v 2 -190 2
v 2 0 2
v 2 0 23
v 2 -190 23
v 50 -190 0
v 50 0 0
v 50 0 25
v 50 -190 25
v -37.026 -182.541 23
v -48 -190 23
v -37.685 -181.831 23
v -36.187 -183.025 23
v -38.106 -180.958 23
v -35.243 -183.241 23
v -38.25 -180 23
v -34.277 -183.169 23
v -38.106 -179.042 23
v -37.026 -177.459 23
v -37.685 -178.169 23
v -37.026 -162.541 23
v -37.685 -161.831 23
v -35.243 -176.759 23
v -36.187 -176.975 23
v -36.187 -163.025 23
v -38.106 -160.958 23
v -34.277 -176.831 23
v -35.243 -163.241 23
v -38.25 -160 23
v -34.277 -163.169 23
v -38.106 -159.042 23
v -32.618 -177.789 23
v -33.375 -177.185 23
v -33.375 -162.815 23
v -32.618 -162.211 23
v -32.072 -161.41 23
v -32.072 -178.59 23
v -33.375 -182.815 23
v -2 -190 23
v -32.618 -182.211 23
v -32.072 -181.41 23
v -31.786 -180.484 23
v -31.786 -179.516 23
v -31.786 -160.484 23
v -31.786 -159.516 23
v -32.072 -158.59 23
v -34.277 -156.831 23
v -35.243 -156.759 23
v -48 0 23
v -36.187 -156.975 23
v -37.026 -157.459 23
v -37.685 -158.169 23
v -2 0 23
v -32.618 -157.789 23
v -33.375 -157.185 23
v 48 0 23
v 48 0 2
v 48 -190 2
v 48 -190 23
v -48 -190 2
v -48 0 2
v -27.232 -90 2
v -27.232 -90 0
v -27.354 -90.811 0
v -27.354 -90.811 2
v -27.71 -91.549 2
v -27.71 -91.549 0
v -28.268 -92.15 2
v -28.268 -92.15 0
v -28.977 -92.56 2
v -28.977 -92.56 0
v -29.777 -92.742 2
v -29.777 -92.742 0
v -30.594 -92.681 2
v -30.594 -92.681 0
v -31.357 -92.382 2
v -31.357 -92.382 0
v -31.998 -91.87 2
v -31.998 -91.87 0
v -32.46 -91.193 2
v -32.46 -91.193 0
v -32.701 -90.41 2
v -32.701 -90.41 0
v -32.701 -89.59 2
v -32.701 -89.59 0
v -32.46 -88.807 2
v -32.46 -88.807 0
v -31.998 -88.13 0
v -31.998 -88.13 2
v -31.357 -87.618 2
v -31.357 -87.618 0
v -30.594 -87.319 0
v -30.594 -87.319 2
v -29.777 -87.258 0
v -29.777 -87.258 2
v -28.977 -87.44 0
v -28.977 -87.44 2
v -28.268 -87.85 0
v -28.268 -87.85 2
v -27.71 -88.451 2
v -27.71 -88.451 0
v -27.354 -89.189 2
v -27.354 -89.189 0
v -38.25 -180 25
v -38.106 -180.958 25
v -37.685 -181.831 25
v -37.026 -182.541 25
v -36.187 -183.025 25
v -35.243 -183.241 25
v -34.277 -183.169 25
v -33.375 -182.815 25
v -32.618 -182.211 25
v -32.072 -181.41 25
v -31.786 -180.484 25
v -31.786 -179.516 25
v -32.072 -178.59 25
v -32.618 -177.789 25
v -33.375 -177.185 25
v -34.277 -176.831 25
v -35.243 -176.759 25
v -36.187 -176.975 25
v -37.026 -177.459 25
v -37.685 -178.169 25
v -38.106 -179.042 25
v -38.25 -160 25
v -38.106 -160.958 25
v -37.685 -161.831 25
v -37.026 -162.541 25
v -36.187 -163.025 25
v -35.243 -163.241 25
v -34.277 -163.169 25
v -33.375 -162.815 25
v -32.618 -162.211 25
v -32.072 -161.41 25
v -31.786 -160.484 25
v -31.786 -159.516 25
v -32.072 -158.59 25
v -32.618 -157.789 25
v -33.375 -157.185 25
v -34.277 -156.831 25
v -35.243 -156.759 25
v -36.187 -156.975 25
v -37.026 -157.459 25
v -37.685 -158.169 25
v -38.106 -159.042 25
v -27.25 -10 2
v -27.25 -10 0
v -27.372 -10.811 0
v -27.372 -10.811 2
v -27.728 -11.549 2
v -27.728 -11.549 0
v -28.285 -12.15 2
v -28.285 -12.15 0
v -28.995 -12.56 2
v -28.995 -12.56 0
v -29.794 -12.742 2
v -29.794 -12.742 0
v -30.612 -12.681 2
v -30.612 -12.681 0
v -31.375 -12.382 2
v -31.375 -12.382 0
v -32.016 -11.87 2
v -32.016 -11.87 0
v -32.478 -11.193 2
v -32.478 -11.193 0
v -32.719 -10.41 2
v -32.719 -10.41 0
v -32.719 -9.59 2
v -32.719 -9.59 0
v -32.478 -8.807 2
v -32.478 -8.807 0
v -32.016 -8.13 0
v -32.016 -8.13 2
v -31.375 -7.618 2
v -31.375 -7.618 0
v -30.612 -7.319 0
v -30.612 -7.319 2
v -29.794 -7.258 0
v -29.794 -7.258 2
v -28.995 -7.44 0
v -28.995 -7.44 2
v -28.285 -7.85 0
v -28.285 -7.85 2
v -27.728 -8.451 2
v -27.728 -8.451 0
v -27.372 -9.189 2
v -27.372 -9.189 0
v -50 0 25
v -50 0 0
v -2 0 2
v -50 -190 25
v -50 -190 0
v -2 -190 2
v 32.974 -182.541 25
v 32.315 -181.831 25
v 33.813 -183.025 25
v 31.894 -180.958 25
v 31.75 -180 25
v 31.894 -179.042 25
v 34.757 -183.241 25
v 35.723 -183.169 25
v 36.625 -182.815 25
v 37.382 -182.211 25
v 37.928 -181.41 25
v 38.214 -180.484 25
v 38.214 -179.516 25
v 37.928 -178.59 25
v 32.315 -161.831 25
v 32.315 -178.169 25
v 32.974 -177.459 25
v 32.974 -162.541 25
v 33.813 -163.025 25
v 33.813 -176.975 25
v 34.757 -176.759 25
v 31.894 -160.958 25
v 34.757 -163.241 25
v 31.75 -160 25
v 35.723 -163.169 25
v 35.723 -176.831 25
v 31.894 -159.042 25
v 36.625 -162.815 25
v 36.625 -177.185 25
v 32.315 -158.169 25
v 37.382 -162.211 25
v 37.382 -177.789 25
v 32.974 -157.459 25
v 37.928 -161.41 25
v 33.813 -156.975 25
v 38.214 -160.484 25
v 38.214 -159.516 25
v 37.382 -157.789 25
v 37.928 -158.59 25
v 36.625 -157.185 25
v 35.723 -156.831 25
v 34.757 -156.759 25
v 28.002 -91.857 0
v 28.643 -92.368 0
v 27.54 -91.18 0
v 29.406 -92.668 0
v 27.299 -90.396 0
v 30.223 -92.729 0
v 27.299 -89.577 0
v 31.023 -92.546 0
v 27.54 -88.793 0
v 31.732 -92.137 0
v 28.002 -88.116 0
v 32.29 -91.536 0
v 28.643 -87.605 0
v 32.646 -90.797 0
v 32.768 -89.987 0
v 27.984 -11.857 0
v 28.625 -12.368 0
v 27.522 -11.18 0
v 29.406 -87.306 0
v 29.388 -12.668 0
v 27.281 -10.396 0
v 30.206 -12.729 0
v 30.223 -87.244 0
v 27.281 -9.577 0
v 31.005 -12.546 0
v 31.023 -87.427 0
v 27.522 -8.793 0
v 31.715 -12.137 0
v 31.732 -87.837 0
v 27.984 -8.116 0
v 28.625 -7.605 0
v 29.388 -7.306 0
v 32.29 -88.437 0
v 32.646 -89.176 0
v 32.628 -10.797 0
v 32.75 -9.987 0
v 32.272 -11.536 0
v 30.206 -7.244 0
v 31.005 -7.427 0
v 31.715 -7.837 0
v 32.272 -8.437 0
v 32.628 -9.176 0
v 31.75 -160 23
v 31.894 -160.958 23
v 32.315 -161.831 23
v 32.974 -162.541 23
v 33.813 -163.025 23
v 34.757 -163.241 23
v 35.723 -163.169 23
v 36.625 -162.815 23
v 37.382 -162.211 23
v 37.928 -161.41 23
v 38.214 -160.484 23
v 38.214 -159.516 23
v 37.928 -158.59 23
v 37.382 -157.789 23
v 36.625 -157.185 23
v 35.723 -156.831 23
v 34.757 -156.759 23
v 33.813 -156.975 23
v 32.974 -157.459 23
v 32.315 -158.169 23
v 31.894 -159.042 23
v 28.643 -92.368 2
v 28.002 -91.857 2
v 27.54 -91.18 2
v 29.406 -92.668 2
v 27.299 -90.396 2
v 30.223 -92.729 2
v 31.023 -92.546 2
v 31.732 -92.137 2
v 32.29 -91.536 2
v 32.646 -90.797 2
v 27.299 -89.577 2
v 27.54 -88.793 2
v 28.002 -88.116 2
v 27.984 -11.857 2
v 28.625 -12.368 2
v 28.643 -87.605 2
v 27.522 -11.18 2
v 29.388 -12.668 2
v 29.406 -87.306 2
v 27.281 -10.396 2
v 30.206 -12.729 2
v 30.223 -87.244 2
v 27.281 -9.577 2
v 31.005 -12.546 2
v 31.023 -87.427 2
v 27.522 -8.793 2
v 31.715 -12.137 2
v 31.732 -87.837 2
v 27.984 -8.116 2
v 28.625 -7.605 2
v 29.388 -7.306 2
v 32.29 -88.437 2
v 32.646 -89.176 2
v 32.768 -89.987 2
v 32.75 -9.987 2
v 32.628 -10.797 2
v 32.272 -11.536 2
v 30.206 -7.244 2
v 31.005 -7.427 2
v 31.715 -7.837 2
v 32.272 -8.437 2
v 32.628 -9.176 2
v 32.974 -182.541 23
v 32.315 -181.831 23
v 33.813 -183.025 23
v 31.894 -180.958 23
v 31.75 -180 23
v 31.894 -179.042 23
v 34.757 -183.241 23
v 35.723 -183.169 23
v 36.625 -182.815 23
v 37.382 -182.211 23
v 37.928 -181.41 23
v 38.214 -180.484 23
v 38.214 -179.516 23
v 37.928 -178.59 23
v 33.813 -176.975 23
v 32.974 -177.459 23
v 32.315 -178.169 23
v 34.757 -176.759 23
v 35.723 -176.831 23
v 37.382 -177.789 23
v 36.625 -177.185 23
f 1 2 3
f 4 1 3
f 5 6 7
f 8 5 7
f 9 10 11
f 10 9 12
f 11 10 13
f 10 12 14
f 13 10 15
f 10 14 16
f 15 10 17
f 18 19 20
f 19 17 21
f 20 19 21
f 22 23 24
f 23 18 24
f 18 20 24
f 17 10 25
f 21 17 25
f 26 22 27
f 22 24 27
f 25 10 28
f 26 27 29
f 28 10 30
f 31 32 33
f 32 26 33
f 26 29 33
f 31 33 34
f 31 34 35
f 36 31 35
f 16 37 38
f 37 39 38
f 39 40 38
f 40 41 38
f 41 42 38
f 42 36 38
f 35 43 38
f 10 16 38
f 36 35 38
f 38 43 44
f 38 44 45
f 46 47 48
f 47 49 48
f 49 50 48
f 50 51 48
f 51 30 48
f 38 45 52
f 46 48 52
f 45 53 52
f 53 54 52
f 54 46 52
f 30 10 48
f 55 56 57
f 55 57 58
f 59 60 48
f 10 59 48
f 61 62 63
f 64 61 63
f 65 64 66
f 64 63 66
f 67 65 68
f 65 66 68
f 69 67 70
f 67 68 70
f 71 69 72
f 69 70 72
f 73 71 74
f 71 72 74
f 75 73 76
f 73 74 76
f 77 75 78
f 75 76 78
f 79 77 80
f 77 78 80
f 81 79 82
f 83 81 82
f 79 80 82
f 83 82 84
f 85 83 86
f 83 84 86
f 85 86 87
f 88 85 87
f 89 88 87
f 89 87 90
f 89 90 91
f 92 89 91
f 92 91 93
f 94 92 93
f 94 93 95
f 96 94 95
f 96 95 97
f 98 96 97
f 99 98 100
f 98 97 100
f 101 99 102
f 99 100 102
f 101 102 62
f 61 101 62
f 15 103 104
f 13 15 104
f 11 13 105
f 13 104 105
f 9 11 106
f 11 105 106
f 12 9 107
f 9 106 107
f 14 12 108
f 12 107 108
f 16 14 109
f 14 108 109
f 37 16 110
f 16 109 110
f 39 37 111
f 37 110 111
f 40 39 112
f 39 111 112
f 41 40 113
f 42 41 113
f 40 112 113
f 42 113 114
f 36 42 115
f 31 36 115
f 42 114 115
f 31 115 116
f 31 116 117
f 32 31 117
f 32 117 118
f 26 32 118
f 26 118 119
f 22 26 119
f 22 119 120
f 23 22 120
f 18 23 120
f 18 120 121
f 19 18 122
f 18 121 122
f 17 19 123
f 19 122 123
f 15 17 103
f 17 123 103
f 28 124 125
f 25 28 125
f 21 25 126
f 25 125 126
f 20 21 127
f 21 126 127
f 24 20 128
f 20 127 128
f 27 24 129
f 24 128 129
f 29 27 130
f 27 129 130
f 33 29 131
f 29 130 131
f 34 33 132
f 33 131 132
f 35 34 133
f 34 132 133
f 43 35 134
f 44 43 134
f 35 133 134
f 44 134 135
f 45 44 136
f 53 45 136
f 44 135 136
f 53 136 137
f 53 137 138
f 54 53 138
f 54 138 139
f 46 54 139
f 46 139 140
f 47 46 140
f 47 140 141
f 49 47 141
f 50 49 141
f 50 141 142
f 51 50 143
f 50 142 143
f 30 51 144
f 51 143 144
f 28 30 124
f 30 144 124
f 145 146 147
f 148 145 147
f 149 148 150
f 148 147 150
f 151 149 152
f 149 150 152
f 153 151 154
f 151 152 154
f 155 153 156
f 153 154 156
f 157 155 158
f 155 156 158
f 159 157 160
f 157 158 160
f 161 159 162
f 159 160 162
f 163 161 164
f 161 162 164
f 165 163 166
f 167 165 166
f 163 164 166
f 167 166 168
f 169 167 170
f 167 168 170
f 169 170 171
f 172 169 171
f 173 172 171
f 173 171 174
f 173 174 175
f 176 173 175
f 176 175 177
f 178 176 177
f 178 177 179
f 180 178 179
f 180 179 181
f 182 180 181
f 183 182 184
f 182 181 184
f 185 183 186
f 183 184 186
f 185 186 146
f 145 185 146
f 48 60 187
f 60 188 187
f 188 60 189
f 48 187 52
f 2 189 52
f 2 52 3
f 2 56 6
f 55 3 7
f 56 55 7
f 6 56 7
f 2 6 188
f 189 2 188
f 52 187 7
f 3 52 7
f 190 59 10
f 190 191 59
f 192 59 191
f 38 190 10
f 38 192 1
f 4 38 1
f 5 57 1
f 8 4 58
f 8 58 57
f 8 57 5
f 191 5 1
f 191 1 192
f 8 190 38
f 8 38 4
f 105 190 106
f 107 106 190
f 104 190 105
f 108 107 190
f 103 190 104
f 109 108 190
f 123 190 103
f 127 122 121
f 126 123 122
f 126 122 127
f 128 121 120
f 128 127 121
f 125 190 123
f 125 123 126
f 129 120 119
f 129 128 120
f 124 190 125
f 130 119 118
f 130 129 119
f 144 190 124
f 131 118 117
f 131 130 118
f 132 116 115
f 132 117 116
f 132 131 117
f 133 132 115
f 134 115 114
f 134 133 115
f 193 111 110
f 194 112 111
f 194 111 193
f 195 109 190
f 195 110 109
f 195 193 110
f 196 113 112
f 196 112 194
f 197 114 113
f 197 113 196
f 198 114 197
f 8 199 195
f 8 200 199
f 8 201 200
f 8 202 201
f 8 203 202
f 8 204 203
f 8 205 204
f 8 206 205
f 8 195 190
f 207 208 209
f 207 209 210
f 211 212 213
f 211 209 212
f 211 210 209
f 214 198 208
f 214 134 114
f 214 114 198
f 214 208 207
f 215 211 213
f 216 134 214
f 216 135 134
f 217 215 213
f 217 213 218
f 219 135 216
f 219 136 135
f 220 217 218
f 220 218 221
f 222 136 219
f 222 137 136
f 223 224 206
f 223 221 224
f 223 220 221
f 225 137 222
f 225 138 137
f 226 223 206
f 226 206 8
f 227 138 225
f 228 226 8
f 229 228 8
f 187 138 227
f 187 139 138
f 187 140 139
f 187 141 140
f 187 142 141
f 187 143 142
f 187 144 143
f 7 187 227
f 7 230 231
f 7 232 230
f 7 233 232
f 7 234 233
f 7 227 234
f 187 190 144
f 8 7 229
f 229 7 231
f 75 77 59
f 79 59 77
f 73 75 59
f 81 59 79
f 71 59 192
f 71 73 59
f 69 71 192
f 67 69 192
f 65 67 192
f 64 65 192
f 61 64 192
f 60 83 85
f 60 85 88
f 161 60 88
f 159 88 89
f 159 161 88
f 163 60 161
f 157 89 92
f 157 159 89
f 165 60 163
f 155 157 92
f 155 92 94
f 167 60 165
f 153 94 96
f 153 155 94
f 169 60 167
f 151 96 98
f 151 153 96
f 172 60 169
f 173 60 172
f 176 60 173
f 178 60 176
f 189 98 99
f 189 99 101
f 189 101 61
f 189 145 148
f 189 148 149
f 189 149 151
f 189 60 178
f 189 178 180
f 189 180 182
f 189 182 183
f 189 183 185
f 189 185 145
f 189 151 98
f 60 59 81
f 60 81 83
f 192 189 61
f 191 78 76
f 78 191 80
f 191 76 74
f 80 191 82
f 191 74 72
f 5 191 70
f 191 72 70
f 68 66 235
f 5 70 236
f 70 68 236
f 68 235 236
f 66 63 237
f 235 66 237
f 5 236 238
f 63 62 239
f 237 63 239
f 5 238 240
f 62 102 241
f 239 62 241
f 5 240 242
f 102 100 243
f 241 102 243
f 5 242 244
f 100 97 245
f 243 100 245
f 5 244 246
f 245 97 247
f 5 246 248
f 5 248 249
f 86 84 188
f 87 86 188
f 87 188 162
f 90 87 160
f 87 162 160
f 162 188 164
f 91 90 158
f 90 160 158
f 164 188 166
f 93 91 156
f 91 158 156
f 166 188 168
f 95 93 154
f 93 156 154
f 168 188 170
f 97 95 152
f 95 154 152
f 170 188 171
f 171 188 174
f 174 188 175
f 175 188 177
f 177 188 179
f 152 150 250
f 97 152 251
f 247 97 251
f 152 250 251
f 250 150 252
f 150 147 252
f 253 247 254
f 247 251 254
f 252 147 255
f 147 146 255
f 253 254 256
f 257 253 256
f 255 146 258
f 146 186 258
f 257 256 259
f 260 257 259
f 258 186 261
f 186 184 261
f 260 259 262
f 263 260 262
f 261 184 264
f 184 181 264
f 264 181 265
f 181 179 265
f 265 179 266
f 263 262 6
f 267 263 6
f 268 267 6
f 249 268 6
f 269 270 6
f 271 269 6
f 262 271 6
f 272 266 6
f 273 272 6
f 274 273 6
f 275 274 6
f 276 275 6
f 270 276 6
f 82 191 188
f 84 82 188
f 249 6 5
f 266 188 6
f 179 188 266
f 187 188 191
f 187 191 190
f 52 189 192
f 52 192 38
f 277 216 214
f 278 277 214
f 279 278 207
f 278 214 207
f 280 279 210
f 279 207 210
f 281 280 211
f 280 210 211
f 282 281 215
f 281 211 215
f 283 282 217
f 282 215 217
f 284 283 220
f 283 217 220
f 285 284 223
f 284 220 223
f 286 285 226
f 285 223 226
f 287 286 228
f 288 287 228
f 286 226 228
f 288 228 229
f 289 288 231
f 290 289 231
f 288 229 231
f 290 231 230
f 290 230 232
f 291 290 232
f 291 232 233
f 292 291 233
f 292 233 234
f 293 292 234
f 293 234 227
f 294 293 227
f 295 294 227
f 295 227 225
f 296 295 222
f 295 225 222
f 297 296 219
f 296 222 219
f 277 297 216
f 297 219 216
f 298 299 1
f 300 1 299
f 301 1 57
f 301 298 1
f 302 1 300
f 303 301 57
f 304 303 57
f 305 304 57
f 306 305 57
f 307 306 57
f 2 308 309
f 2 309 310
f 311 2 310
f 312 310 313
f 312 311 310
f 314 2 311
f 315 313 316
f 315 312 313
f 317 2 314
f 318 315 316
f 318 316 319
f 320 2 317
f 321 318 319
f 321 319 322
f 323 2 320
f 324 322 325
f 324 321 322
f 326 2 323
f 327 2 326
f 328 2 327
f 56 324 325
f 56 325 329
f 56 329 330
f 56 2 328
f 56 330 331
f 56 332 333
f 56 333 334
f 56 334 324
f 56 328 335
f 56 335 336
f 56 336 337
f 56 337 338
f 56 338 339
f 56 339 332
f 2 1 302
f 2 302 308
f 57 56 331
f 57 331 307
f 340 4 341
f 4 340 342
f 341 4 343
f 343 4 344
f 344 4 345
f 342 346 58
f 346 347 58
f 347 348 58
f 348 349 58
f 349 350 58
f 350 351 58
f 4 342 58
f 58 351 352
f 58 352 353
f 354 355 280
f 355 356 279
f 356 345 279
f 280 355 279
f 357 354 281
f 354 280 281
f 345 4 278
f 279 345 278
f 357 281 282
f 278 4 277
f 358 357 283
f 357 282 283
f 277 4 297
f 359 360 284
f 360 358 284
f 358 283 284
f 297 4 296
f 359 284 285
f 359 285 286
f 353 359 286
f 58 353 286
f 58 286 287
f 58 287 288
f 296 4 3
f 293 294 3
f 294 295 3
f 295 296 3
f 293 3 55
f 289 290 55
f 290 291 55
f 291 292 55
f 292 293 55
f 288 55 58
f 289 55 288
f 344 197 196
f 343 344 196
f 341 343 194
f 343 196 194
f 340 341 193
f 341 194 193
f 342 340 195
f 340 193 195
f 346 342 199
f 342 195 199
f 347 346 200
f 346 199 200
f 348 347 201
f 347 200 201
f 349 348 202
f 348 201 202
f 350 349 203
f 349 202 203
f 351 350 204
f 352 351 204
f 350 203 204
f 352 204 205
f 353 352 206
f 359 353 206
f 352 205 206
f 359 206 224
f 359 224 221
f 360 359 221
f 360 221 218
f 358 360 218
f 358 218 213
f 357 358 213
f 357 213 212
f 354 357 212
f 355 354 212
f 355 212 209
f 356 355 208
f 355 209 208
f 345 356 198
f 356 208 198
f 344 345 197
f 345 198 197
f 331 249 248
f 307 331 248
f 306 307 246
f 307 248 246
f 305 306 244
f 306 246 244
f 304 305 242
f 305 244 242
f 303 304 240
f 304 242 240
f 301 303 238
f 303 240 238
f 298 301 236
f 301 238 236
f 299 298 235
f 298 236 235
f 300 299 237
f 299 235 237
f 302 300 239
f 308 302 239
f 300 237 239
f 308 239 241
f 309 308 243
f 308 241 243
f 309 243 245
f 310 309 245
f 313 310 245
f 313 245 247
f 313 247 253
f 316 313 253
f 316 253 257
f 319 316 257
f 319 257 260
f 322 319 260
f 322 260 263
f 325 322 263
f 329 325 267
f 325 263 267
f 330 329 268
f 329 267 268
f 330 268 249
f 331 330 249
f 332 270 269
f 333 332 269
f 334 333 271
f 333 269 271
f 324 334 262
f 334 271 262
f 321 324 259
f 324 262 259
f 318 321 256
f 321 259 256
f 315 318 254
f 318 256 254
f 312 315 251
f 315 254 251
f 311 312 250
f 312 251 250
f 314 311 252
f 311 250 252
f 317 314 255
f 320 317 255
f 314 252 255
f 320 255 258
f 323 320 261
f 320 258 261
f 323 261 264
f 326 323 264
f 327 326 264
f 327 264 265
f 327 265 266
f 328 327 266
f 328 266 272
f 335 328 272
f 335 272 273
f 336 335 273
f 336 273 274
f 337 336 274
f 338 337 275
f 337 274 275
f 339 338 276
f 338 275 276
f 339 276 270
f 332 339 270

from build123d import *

# Parameters (mm, degrees)
SKETCH_W        = 100
SKETCH_H        = 25
SKETCH_W_2      = 46
SKETCH_H_2      = 21
PAD_DEPTH       = 190
SKETCH001_R     = 2.75
POCKET_DEPTH    = 2
SKETCH002_R     = 3.25
POCKET001_DEPTH = 2


with BuildPart() as part:
    # Sketch → Pad (new body)
    with BuildSketch(Plane.XZ):
        with Locations((0, 12.5)):
            Rectangle(SKETCH_W, SKETCH_H)
        with Locations((-25, 12.5)):
            Rectangle(SKETCH_W_2, SKETCH_H_2, mode=Mode.SUBTRACT)
        with Locations((25, 12.5)):
            Rectangle(SKETCH_W_2, SKETCH_H_2, mode=Mode.SUBTRACT)
    extrude(amount=PAD_DEPTH)

    # Sketch001 (on Face3 of Pad) → Pocket (cut)
    with BuildSketch(Plane(origin=(0, 0, 0), x_dir=(1, 0, 0), z_dir=(0, 0, -1))):
        with Locations((-29.982102, 89.999998)):
            Circle(SKETCH001_R)
        with Locations((30.017897, 89.986574)):
            Circle(SKETCH001_R)
        with Locations((-30, 10)):
            Circle(SKETCH001_R)
        with Locations((29.999998, 9.986576)):
            Circle(SKETCH001_R)
    extrude(amount=-POCKET_DEPTH, mode=Mode.SUBTRACT)

    # Sketch002 (on Face1 of Pocket) → Pocket001 (cut)
    with BuildSketch(Plane(origin=(0, 0, 25), x_dir=(-1, 0, 0), z_dir=(0, 0, 1))):
        with Locations((-35, 180)):
            Circle(SKETCH002_R)
        with Locations((35, 180)):
            Circle(SKETCH002_R)
        with Locations((-35, 160)):
            Circle(SKETCH002_R)
        with Locations((35, 160)):
            Circle(SKETCH002_R)
    extrude(amount=-POCKET001_DEPTH, mode=Mode.SUBTRACT)


solid = part.part
